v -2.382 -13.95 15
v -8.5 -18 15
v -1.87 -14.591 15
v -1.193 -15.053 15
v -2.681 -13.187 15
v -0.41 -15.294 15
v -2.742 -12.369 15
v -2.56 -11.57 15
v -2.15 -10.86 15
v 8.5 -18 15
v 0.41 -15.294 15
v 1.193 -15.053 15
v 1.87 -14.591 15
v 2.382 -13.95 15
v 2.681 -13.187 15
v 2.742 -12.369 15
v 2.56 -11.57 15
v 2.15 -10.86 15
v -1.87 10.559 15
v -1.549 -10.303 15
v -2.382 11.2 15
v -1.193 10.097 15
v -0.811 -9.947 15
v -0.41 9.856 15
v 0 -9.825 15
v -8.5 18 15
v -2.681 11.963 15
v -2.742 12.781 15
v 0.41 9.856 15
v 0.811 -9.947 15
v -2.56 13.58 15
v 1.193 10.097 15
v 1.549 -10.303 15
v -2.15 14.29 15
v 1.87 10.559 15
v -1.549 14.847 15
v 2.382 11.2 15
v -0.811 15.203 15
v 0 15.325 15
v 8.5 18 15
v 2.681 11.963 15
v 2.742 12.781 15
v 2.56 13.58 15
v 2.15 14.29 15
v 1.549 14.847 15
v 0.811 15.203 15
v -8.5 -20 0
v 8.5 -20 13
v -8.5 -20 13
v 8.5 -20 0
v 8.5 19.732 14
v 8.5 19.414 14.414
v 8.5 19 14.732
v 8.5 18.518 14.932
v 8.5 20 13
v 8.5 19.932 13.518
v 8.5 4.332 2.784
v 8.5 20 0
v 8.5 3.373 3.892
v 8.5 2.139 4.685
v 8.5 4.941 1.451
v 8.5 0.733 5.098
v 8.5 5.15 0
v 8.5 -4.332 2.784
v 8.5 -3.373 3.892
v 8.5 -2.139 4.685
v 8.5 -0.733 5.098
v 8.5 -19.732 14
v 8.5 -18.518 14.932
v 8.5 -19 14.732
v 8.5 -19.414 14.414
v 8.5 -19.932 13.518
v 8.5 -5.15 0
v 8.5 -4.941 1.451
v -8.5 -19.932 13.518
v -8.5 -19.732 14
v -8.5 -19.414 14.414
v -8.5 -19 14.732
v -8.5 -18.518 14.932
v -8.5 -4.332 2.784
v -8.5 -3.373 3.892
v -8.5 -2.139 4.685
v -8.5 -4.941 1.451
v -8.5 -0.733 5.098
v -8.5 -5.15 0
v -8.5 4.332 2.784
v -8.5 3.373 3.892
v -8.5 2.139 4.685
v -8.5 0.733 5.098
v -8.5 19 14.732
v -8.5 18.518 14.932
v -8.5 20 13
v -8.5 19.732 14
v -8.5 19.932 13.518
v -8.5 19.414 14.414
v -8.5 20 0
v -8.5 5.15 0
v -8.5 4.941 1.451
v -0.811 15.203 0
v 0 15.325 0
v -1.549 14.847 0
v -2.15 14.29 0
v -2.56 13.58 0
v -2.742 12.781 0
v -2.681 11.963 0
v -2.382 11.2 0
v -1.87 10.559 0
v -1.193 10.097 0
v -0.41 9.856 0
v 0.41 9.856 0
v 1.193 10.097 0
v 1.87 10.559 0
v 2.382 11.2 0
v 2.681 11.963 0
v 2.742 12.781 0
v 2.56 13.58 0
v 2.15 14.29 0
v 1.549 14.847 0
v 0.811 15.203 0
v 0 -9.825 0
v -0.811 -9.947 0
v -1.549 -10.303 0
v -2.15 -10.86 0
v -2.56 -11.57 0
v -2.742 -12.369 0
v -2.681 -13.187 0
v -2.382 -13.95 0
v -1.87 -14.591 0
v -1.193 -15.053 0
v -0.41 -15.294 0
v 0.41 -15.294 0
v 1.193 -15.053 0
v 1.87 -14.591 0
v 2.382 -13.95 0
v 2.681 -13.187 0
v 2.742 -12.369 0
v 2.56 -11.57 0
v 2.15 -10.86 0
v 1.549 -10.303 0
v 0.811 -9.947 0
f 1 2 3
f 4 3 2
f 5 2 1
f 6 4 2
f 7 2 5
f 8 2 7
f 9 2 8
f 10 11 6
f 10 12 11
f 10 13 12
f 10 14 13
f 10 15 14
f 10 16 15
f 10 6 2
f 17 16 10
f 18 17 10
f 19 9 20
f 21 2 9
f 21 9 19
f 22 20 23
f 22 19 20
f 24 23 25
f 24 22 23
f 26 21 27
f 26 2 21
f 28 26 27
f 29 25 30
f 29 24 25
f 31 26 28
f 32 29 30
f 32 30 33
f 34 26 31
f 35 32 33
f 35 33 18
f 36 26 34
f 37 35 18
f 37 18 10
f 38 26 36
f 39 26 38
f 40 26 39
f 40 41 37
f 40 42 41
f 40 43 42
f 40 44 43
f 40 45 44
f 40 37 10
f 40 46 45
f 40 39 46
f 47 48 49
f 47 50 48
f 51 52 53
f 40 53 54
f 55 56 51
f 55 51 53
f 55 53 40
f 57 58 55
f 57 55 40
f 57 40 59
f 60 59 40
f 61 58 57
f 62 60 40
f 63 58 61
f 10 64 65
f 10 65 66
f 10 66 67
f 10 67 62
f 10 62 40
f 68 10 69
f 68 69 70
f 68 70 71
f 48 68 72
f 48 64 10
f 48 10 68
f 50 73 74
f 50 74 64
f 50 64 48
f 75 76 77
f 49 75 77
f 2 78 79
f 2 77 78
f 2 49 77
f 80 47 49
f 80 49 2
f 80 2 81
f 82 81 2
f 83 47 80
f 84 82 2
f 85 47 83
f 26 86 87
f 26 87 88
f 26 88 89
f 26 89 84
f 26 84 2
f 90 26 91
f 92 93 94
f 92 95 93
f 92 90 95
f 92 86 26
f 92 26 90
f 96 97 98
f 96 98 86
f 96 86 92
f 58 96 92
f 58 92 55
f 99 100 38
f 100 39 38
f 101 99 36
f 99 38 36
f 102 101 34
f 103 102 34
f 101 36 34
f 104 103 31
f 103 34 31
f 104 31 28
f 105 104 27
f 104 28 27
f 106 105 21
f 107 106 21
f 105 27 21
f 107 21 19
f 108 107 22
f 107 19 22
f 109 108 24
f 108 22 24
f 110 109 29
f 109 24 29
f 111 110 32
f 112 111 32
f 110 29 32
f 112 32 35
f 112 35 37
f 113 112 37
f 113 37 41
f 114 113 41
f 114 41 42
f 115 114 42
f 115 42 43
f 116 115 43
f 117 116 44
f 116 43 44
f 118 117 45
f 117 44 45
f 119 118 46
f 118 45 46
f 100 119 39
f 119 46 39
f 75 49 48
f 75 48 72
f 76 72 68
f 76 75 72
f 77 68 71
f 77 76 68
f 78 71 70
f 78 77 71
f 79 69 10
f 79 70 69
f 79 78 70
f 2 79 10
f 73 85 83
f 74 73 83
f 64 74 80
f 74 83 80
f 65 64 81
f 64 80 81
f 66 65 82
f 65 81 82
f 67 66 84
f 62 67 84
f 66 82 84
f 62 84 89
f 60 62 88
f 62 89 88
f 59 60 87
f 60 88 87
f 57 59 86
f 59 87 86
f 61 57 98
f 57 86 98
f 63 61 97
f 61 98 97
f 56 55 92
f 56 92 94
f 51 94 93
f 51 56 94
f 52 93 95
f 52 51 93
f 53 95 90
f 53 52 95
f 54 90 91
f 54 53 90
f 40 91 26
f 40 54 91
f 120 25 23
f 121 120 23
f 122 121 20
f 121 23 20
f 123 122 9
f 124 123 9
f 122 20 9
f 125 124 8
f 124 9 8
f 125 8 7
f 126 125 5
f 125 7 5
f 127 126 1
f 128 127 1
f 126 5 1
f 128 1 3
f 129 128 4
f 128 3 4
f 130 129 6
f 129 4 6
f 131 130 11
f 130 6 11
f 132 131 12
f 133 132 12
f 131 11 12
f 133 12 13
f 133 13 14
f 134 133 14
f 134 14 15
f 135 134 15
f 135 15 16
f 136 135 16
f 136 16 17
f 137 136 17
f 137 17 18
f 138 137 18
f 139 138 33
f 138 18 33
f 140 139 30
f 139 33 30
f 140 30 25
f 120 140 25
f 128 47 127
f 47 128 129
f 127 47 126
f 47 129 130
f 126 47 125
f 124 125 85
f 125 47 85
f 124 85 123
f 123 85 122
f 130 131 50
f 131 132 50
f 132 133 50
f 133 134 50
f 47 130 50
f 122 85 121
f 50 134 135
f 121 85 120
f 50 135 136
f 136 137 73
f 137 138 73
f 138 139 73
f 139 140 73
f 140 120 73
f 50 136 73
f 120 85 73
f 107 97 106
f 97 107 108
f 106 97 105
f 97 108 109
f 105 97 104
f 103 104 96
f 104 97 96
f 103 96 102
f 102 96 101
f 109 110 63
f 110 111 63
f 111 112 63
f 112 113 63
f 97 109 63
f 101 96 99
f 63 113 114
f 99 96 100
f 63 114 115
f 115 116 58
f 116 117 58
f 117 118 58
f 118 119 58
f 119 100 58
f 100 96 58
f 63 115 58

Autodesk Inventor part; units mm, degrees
ref_plane "YZ Plane" through (0, 0, 0) normal (1, 0, 0) x (0, 1, 0)
ref_plane "XZ Plane" through (0, 0, 0) normal (0, 1, 0) x (-1, 0, 0)
ref_plane "XY Plane" through (0, 0, 0) normal (0, 0, 1) x (1, 0, 0)
sketch "Sketch1" plane through (0, 0, 0) normal (0, 0, 1) x (1, 0, 0)
  line L0 (-8.5, 20) -> (8.5, 20)
  line L1 (8.5, 20) -> (8.5, -20)
  line L2 (8.5, -20) -> (-8.5, -20)
  line L3 (-8.5, -20) -> (-8.5, 20)
  point P0 (0, 0)
  point P1 (-8.5, 0)
  point P2 (0, 20)
  dimension "d0" = 40
  dimension "d1" = 17
extrude "Extrusion1" add sketch "Sketch1" along normal blind 15
sketch "Sketch2" plane through (-8.5, -20, 0) normal (-1, 0, 0) x (0, 0, 1)
  circle A0 centre (0, 20) radius 5.15
  line L0 (0, 40) -> (0, 0) projected
  dimension "d5" = 10.3
  dimension "d8" = 0
extrude "Extrusion2" cut sketch "Sketch2" against normal through all
sketch "Sketch3" plane through (0, 0, 0) normal (0, 0, -1) x (-1, 0, 0)
  line L0 (-8.5, 5.15) -> (-8.5, 20) projected
  line L1 (-8.5, -20) -> (-8.5, -5.15) projected
  line L2 (8.5, -20) -> (-8.5, -20) projected
  line L3 (-8.5, 20) -> (8.5, 20) projected
  point P0 (0, 0)
  point P1 (0, -12.575)
  point P2 (0, 12.575)
  point P3 (-8.5, 12.575)
  point P4 (-8.5, -12.575)
  point P5 (0, -20)
  point P6 (0, 20)
hole "Hole1" at (0, -12.575, 0) at (0, 12.575, 0) direction (0, 0, 1) diameter 5.5 end through all
fillet "Fillet1" radius 2 2 edges at (0, -20, 15) (0, 20, 15)
properties part number "0008-10-010 Fixare AxaX"
